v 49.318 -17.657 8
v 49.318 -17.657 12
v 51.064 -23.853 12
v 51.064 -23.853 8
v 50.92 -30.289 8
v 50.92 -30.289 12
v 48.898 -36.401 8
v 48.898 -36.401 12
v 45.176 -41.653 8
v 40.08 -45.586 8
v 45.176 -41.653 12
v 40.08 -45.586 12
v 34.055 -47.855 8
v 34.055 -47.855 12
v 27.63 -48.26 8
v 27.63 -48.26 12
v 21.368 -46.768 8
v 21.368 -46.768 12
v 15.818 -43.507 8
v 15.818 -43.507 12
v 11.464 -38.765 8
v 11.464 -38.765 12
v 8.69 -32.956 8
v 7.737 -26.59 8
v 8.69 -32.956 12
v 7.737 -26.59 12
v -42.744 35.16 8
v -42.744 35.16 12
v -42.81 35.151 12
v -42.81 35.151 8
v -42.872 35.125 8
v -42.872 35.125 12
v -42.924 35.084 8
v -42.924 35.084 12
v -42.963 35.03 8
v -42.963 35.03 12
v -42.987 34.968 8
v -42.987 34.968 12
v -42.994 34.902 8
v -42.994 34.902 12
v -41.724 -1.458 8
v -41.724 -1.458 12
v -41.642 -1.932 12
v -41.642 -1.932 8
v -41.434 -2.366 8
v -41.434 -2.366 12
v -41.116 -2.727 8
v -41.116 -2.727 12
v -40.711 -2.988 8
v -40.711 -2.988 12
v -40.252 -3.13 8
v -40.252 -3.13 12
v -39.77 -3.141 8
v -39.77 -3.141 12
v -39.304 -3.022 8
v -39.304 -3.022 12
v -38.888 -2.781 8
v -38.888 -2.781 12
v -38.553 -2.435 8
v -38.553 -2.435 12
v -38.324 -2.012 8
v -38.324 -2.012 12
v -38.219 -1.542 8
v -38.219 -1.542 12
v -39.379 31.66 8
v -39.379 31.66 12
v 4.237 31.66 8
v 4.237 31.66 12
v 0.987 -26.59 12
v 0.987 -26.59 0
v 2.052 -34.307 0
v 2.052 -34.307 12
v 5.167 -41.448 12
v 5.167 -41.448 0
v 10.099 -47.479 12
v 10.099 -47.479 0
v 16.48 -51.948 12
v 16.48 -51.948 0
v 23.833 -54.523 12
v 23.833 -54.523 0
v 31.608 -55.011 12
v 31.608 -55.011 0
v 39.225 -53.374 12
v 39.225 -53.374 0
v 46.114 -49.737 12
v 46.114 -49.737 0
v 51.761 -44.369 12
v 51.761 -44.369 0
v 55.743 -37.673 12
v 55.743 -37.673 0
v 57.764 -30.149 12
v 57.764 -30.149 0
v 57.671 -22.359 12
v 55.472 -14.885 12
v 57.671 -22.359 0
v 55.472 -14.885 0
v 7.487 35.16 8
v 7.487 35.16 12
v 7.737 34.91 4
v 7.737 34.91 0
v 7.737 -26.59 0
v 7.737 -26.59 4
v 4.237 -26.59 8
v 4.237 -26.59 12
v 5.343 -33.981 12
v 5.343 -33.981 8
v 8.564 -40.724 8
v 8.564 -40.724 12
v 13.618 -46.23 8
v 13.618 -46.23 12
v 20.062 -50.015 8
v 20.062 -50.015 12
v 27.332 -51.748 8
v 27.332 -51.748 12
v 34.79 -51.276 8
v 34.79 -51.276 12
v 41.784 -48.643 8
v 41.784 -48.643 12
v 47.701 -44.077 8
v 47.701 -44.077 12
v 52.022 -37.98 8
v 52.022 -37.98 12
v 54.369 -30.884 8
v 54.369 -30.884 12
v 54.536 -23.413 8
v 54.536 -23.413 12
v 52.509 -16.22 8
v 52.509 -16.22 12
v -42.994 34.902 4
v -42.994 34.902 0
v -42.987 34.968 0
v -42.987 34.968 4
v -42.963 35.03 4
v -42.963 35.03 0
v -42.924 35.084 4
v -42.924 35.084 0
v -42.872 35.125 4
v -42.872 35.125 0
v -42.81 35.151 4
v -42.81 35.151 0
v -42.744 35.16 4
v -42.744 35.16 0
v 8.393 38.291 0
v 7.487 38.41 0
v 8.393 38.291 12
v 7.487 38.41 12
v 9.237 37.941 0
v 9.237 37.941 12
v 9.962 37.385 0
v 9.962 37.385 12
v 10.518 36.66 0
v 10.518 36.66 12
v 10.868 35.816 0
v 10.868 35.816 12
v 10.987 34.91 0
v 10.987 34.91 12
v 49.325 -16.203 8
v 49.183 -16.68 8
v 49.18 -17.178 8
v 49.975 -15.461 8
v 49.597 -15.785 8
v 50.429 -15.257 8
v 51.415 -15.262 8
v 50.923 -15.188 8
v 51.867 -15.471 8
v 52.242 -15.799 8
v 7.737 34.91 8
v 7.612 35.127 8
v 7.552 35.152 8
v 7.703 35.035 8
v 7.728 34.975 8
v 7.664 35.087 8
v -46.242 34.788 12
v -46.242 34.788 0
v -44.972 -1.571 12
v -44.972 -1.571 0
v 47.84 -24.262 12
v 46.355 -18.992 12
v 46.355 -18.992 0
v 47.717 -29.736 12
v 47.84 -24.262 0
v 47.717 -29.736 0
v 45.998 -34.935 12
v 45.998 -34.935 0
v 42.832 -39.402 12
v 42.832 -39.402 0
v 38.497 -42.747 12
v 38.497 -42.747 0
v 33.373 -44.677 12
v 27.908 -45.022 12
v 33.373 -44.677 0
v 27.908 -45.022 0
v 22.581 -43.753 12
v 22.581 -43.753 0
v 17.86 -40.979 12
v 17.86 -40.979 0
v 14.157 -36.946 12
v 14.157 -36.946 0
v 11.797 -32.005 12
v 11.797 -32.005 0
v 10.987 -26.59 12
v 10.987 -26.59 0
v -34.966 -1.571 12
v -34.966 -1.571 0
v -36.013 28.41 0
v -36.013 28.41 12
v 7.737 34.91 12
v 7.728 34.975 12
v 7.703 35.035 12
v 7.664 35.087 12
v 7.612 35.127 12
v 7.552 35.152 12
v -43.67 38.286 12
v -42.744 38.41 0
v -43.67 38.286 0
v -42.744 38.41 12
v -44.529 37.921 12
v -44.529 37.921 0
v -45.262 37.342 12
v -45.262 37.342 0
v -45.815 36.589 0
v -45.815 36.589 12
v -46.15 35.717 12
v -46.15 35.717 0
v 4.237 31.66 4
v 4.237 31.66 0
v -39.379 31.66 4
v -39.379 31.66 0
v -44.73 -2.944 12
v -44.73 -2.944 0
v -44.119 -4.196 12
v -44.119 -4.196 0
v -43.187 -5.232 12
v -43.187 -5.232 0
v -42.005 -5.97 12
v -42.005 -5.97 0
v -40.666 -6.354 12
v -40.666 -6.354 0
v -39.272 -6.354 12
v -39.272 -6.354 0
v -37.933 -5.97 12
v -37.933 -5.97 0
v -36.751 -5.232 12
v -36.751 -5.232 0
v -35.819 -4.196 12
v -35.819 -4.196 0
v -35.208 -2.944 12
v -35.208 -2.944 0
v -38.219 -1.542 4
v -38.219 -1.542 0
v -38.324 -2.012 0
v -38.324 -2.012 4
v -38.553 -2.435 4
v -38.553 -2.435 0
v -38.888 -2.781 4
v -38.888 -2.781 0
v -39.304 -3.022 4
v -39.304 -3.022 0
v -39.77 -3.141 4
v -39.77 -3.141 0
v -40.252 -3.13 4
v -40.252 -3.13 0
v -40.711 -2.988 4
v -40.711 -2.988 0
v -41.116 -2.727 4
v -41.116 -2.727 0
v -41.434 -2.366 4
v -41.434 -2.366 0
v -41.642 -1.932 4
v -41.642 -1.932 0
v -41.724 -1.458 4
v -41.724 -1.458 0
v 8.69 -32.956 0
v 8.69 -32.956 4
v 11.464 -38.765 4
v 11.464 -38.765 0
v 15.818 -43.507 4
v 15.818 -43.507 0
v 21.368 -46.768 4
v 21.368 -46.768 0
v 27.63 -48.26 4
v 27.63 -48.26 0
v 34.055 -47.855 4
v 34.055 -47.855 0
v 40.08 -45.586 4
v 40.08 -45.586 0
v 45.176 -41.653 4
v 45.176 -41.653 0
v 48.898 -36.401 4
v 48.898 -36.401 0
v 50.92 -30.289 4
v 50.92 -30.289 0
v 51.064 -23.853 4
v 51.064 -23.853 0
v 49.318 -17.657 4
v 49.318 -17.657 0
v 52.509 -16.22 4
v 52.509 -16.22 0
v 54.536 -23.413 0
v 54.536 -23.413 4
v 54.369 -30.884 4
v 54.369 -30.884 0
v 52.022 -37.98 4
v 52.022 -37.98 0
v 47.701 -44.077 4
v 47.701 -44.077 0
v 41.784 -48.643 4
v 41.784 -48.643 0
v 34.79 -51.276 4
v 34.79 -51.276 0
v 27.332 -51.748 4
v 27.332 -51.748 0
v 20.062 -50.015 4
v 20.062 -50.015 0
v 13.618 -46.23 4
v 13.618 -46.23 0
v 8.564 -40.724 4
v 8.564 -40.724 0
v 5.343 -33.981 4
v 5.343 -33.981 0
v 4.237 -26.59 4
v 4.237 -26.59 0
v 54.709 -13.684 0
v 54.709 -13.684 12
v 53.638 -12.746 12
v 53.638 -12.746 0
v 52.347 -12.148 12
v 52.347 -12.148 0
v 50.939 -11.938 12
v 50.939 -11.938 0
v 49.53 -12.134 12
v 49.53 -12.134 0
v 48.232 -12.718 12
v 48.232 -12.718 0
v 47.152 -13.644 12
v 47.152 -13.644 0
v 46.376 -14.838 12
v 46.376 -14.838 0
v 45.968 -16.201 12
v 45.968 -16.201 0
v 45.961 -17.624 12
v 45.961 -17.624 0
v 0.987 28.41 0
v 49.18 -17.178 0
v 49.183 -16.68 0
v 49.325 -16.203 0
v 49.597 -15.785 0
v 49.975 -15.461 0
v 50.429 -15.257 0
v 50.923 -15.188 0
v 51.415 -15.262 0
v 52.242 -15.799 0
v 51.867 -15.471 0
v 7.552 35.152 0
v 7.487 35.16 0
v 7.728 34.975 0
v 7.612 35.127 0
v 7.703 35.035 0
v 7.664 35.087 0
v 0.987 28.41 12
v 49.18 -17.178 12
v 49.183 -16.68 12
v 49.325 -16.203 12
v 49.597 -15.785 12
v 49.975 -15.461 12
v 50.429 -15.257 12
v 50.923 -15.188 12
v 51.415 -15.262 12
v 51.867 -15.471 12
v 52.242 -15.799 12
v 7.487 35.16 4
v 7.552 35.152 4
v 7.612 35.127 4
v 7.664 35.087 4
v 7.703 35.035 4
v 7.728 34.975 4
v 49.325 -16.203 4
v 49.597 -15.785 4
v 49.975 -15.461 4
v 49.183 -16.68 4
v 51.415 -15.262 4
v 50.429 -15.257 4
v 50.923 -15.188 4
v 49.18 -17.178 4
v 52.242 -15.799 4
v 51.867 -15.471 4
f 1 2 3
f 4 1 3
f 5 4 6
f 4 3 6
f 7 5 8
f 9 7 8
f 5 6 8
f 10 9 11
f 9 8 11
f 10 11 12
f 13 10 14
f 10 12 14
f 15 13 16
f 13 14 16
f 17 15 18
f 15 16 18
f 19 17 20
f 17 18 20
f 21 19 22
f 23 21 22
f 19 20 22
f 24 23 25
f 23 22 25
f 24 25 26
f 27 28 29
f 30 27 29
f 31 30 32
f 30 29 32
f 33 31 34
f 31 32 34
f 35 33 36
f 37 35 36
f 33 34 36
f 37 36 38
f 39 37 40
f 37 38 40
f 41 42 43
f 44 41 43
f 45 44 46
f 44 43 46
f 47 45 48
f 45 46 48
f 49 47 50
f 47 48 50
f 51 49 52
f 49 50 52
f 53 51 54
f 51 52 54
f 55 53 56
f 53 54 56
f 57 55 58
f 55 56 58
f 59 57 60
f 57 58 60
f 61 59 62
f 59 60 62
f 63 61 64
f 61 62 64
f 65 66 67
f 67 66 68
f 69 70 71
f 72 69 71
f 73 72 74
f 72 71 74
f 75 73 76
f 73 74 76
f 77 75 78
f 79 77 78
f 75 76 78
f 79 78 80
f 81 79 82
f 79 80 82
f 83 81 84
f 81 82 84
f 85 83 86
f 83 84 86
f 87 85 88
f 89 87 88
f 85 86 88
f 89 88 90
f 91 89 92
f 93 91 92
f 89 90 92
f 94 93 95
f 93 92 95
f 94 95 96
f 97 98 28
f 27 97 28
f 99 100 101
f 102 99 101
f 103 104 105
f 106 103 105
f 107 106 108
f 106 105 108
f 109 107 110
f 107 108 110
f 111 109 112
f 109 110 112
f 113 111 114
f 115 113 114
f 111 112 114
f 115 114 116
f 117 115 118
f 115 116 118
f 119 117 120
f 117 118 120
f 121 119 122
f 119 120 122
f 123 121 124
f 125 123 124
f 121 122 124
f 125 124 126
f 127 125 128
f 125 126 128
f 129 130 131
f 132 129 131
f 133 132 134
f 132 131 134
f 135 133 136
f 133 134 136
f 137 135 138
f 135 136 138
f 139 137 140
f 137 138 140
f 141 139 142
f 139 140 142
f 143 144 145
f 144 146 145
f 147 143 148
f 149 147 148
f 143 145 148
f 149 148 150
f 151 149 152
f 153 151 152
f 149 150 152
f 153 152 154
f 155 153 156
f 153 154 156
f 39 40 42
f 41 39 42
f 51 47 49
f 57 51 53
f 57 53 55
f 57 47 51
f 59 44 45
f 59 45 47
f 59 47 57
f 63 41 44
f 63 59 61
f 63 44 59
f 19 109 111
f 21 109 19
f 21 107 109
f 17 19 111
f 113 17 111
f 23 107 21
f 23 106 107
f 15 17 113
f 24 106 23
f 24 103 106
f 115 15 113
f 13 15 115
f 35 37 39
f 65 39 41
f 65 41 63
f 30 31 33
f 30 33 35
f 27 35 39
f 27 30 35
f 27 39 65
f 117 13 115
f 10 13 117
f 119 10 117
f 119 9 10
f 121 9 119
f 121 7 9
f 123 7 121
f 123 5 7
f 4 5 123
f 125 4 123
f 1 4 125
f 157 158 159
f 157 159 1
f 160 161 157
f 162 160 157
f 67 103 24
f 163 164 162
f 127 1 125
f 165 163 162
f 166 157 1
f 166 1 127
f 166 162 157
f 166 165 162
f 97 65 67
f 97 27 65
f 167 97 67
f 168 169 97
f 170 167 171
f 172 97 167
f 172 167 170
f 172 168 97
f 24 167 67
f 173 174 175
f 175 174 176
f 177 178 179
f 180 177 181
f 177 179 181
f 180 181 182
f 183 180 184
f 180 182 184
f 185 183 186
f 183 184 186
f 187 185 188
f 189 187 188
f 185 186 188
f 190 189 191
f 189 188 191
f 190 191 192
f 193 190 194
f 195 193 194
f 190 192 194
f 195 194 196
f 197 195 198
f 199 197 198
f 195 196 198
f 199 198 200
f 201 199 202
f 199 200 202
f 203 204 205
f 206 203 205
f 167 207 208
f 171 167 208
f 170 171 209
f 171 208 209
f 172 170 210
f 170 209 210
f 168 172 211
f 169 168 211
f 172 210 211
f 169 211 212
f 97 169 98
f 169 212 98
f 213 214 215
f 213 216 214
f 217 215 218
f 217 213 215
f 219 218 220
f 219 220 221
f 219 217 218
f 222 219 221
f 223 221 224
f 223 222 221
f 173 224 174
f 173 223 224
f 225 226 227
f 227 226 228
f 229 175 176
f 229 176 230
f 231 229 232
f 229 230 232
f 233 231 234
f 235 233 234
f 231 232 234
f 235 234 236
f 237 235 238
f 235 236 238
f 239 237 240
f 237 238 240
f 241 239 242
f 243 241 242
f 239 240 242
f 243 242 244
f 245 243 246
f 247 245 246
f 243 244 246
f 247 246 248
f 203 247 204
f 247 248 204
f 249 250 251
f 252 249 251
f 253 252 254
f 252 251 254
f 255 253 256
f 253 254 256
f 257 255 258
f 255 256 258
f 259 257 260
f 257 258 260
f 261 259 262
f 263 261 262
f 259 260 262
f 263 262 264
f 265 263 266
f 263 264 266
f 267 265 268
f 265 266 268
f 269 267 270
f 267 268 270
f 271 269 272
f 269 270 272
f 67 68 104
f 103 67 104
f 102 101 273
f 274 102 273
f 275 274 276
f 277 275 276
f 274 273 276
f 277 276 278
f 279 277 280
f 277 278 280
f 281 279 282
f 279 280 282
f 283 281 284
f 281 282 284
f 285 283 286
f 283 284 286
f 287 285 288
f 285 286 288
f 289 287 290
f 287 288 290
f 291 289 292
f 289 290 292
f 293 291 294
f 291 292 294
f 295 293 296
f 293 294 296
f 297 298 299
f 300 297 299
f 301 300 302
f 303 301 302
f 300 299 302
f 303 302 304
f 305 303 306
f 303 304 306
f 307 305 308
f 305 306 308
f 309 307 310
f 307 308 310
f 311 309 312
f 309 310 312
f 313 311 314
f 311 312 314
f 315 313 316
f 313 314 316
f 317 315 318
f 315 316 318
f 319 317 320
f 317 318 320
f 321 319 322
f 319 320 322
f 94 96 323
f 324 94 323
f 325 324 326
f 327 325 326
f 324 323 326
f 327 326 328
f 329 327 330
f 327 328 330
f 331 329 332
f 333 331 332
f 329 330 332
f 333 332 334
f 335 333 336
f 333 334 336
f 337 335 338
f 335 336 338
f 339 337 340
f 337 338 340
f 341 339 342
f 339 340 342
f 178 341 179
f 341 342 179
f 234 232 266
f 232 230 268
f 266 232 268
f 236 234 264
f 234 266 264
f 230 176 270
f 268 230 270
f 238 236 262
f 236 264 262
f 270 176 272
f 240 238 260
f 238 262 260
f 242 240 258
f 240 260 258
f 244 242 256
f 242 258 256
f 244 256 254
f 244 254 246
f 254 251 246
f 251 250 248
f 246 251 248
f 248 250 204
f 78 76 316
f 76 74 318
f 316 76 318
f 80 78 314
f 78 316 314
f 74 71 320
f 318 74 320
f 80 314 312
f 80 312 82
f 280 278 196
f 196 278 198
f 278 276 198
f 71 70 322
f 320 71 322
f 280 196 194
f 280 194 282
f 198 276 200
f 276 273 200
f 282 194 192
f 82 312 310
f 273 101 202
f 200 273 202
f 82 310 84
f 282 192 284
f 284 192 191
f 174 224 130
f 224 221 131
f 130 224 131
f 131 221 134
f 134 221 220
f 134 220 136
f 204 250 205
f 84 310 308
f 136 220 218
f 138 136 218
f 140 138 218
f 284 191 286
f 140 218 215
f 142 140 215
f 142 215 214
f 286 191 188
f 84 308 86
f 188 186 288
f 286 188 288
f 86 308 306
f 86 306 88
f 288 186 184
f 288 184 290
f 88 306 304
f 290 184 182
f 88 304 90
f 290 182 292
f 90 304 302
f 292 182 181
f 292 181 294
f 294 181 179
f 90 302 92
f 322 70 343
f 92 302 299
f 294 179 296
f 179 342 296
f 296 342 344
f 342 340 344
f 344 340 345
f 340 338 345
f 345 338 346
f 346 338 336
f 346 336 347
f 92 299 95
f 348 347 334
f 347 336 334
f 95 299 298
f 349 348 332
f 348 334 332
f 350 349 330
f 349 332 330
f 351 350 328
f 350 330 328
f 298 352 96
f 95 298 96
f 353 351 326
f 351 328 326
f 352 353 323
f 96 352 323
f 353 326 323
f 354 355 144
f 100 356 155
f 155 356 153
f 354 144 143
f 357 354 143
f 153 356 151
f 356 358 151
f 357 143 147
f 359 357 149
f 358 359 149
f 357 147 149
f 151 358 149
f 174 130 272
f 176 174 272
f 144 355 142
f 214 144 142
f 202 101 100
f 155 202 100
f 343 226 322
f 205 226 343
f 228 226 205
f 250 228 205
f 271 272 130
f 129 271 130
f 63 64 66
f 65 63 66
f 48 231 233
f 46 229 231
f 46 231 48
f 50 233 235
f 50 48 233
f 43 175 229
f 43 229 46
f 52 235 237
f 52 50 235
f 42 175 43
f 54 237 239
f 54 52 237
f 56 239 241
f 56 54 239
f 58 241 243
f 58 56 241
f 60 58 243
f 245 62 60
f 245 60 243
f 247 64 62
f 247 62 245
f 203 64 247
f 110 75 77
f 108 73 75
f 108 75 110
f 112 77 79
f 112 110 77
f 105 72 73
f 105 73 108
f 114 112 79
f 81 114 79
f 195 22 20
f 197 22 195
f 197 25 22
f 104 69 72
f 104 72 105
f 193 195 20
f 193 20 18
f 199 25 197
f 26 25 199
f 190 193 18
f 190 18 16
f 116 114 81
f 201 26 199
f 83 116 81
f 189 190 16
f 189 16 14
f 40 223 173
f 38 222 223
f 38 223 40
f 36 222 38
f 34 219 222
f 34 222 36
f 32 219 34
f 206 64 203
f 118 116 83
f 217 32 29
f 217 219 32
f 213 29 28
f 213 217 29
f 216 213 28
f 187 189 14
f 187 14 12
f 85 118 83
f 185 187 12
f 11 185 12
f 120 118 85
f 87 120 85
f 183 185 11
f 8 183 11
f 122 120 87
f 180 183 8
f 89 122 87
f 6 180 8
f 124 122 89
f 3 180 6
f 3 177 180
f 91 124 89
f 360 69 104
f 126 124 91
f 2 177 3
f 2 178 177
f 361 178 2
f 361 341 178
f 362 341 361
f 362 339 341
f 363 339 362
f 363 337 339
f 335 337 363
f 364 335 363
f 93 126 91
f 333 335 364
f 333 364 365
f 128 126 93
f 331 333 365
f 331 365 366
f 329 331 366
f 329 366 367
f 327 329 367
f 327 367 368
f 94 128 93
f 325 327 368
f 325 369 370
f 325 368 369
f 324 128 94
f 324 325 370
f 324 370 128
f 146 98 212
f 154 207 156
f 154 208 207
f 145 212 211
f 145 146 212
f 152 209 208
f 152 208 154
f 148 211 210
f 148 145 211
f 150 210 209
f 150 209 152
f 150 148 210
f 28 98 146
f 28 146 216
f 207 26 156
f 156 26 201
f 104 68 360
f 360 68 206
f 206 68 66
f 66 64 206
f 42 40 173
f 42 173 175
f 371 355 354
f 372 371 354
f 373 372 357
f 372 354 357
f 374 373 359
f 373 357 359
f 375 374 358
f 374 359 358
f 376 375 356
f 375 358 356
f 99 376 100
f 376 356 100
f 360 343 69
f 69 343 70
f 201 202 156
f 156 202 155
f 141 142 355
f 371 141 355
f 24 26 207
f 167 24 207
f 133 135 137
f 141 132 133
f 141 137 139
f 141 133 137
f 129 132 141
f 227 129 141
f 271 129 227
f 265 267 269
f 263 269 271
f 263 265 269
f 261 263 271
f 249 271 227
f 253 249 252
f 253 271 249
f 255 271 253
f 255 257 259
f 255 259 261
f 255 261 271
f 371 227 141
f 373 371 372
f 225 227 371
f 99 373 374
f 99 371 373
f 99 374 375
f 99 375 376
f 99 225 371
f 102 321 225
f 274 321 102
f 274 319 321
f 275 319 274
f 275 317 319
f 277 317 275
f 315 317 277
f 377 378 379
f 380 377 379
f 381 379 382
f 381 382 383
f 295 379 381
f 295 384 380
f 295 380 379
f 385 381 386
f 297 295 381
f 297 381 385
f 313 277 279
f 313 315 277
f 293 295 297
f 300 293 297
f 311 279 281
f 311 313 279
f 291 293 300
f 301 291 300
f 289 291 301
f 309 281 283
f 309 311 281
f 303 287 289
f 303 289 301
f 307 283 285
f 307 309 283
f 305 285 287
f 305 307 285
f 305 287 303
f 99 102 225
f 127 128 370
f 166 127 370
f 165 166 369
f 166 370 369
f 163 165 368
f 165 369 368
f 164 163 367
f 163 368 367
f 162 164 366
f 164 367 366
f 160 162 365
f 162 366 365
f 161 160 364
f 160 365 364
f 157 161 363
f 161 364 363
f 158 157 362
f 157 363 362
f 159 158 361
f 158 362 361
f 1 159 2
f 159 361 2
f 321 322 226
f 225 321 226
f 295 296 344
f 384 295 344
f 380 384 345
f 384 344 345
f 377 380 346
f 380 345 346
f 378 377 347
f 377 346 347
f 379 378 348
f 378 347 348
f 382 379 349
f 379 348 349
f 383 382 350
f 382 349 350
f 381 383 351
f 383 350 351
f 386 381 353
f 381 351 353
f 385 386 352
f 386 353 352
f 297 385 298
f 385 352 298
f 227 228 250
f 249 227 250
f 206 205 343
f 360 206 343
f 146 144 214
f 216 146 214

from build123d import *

# Parameters (mm, degrees)
F1_DEPTH = 12
F2_R     = 3.5
F4_DEPTH = 4
F6_DEPTH = 4


with BuildPart() as f1:
    # F0 (on Top) → F1 (new body)
    with BuildSketch(Plane.XY):
        with BuildLine():
            Line((10.9868871146, 38.4103373848), (-46.3684160233, 38.4103373848))
            Line((-46.3684160233, 38.4103373848), (-44.9722234273, -1.5713874258))
            ThreePointArc((-44.9722234273, -1.5713874258), (-39.9691757058, -6.4027744503), (-34.9661279843, -1.5713874258))
            Line((-34.9661279843, -1.5713874258), (-36.0131128854, 28.4103373848))
            Line((-36.0131128854, 28.4103373848), (0.9868871146, 28.4103373848))
            Line((0.9868871146, 28.4103373848), (0.9868871146, -26.5896626152))
            ThreePointArc((0.9868871146, -26.5896626152), (35.472835987, -54.4539482888), (55.4723899987, -14.8848072183))
            ThreePointArc((55.4723899987, -14.8848072183), (48.8600464406, -12.3794304662), (46.3546696885, -18.9917740242))
            ThreePointArc((46.3546696885, -18.9917740242), (33.3725030493, -44.6770059472), (10.9868871146, -26.5896626152))
            Line((10.9868871146, -26.5896626152), (10.9868871146, 38.4103373848))
        make_face()
    extrude(amount=F1_DEPTH)

    # F2
    f2_edges = [f1.edges().sort_by_distance(p)[0] for p in [
        (10.986887, 38.410337, 6),
        (-46.368416, 38.410337, 6),
    ]]
    fillet(f2_edges, radius=F2_R)

    # F3 (on face) → F4 (cut)
    with BuildSketch(Plane.XY.offset(12)):
        with BuildLine():
            Line((7.4868871146, 35.16033604), (-42.744059925, 35.16033604))
            ThreePointArc((-42.744059925, 35.16033604), (-42.9238939077, 35.0840010432), (-42.9939062878, 34.9016125575))
            Line((-42.9939062878, 34.9016125575), (-41.7242018955, -1.4579640146))
            ThreePointArc((-41.7242018955, -1.4579640146), (-40.0114090798, -3.1522651845), (-38.219126663, -1.5422839975))
            Line((-38.219126663, -1.5422839975), (-39.3785877977, 31.6603387296))
            Line((-39.3785877977, 31.6603387296), (4.2368884594, 31.6603387296))
            Line((4.2368884594, 31.6603387296), (4.2368884594, -26.5896626152))
            ThreePointArc((4.2368884594, -26.5896626152), (34.7902274998, -51.276440713), (52.5091296718, -16.2195719825))
            ThreePointArc((52.5091296718, -16.2195719825), (50.1948112049, -15.3426907931), (49.3179300155, -17.65700926))
            ThreePointArc((49.3179300155, -17.65700926), (34.0551115365, -47.854513523), (7.7368857699, -26.5896626152))
            Line((7.7368857699, -26.5896626152), (7.7368857699, 34.9103373848))
            ThreePointArc((7.7368857699, 34.9103373848), (7.663662859, 35.0871131292), (7.4868871146, 35.16033604))
        make_face()
    extrude(amount=-F4_DEPTH, mode=Mode.SUBTRACT)

    # F5 (on face) → F6 (cut)
    with BuildSketch(Plane(origin=(0, 0, 0), x_dir=(1, 0, 0), z_dir=(0, 0, -1))):
        with BuildLine():
            Line((-41.7242032033, 1.4579640602), (-42.9939075956, -34.9016125119))
            ThreePointArc((-42.9939075956, -34.9016125119), (-42.923894849, -35.0840019523), (-42.744059925, -35.1603373486))
            Line((-42.744059925, -35.1603373486), (7.4868871146, -35.1603373486))
            ThreePointArc((7.4868871146, -35.1603373486), (7.6636637843, -35.0871140545), (7.7368870784, -34.9103373848))
            Line((7.7368870784, -34.9103373848), (7.7368870784, 26.5896626152))
            ThreePointArc((7.7368870784, 26.5896626152), (34.0551112616, 47.8545122436), (49.3179288223, 17.6570097974))
            ThreePointArc((49.3179288223, 17.6570097974), (50.1948106674, 15.3426896), (52.5091308649, 16.2195714451))
            ThreePointArc((52.5091308649, 16.2195714451), (34.7902277746, 51.2764419924), (4.2368871508, 26.5896626152))
            Line((4.2368871508, 26.5896626152), (4.2368871508, -31.660337421))
            Line((4.2368871508, -31.660337421), (-39.3785864427, -31.660337421))
            Line((-39.3785864427, -31.660337421), (-38.2191253525, 1.5422840291))
            ThreePointArc((-38.2191253525, 1.5422840291), (-40.0114090726, 3.1522664936), (-41.7242032033, 1.4579640602))
        make_face()
    extrude(amount=-F6_DEPTH, mode=Mode.SUBTRACT)


solid = f1.part
